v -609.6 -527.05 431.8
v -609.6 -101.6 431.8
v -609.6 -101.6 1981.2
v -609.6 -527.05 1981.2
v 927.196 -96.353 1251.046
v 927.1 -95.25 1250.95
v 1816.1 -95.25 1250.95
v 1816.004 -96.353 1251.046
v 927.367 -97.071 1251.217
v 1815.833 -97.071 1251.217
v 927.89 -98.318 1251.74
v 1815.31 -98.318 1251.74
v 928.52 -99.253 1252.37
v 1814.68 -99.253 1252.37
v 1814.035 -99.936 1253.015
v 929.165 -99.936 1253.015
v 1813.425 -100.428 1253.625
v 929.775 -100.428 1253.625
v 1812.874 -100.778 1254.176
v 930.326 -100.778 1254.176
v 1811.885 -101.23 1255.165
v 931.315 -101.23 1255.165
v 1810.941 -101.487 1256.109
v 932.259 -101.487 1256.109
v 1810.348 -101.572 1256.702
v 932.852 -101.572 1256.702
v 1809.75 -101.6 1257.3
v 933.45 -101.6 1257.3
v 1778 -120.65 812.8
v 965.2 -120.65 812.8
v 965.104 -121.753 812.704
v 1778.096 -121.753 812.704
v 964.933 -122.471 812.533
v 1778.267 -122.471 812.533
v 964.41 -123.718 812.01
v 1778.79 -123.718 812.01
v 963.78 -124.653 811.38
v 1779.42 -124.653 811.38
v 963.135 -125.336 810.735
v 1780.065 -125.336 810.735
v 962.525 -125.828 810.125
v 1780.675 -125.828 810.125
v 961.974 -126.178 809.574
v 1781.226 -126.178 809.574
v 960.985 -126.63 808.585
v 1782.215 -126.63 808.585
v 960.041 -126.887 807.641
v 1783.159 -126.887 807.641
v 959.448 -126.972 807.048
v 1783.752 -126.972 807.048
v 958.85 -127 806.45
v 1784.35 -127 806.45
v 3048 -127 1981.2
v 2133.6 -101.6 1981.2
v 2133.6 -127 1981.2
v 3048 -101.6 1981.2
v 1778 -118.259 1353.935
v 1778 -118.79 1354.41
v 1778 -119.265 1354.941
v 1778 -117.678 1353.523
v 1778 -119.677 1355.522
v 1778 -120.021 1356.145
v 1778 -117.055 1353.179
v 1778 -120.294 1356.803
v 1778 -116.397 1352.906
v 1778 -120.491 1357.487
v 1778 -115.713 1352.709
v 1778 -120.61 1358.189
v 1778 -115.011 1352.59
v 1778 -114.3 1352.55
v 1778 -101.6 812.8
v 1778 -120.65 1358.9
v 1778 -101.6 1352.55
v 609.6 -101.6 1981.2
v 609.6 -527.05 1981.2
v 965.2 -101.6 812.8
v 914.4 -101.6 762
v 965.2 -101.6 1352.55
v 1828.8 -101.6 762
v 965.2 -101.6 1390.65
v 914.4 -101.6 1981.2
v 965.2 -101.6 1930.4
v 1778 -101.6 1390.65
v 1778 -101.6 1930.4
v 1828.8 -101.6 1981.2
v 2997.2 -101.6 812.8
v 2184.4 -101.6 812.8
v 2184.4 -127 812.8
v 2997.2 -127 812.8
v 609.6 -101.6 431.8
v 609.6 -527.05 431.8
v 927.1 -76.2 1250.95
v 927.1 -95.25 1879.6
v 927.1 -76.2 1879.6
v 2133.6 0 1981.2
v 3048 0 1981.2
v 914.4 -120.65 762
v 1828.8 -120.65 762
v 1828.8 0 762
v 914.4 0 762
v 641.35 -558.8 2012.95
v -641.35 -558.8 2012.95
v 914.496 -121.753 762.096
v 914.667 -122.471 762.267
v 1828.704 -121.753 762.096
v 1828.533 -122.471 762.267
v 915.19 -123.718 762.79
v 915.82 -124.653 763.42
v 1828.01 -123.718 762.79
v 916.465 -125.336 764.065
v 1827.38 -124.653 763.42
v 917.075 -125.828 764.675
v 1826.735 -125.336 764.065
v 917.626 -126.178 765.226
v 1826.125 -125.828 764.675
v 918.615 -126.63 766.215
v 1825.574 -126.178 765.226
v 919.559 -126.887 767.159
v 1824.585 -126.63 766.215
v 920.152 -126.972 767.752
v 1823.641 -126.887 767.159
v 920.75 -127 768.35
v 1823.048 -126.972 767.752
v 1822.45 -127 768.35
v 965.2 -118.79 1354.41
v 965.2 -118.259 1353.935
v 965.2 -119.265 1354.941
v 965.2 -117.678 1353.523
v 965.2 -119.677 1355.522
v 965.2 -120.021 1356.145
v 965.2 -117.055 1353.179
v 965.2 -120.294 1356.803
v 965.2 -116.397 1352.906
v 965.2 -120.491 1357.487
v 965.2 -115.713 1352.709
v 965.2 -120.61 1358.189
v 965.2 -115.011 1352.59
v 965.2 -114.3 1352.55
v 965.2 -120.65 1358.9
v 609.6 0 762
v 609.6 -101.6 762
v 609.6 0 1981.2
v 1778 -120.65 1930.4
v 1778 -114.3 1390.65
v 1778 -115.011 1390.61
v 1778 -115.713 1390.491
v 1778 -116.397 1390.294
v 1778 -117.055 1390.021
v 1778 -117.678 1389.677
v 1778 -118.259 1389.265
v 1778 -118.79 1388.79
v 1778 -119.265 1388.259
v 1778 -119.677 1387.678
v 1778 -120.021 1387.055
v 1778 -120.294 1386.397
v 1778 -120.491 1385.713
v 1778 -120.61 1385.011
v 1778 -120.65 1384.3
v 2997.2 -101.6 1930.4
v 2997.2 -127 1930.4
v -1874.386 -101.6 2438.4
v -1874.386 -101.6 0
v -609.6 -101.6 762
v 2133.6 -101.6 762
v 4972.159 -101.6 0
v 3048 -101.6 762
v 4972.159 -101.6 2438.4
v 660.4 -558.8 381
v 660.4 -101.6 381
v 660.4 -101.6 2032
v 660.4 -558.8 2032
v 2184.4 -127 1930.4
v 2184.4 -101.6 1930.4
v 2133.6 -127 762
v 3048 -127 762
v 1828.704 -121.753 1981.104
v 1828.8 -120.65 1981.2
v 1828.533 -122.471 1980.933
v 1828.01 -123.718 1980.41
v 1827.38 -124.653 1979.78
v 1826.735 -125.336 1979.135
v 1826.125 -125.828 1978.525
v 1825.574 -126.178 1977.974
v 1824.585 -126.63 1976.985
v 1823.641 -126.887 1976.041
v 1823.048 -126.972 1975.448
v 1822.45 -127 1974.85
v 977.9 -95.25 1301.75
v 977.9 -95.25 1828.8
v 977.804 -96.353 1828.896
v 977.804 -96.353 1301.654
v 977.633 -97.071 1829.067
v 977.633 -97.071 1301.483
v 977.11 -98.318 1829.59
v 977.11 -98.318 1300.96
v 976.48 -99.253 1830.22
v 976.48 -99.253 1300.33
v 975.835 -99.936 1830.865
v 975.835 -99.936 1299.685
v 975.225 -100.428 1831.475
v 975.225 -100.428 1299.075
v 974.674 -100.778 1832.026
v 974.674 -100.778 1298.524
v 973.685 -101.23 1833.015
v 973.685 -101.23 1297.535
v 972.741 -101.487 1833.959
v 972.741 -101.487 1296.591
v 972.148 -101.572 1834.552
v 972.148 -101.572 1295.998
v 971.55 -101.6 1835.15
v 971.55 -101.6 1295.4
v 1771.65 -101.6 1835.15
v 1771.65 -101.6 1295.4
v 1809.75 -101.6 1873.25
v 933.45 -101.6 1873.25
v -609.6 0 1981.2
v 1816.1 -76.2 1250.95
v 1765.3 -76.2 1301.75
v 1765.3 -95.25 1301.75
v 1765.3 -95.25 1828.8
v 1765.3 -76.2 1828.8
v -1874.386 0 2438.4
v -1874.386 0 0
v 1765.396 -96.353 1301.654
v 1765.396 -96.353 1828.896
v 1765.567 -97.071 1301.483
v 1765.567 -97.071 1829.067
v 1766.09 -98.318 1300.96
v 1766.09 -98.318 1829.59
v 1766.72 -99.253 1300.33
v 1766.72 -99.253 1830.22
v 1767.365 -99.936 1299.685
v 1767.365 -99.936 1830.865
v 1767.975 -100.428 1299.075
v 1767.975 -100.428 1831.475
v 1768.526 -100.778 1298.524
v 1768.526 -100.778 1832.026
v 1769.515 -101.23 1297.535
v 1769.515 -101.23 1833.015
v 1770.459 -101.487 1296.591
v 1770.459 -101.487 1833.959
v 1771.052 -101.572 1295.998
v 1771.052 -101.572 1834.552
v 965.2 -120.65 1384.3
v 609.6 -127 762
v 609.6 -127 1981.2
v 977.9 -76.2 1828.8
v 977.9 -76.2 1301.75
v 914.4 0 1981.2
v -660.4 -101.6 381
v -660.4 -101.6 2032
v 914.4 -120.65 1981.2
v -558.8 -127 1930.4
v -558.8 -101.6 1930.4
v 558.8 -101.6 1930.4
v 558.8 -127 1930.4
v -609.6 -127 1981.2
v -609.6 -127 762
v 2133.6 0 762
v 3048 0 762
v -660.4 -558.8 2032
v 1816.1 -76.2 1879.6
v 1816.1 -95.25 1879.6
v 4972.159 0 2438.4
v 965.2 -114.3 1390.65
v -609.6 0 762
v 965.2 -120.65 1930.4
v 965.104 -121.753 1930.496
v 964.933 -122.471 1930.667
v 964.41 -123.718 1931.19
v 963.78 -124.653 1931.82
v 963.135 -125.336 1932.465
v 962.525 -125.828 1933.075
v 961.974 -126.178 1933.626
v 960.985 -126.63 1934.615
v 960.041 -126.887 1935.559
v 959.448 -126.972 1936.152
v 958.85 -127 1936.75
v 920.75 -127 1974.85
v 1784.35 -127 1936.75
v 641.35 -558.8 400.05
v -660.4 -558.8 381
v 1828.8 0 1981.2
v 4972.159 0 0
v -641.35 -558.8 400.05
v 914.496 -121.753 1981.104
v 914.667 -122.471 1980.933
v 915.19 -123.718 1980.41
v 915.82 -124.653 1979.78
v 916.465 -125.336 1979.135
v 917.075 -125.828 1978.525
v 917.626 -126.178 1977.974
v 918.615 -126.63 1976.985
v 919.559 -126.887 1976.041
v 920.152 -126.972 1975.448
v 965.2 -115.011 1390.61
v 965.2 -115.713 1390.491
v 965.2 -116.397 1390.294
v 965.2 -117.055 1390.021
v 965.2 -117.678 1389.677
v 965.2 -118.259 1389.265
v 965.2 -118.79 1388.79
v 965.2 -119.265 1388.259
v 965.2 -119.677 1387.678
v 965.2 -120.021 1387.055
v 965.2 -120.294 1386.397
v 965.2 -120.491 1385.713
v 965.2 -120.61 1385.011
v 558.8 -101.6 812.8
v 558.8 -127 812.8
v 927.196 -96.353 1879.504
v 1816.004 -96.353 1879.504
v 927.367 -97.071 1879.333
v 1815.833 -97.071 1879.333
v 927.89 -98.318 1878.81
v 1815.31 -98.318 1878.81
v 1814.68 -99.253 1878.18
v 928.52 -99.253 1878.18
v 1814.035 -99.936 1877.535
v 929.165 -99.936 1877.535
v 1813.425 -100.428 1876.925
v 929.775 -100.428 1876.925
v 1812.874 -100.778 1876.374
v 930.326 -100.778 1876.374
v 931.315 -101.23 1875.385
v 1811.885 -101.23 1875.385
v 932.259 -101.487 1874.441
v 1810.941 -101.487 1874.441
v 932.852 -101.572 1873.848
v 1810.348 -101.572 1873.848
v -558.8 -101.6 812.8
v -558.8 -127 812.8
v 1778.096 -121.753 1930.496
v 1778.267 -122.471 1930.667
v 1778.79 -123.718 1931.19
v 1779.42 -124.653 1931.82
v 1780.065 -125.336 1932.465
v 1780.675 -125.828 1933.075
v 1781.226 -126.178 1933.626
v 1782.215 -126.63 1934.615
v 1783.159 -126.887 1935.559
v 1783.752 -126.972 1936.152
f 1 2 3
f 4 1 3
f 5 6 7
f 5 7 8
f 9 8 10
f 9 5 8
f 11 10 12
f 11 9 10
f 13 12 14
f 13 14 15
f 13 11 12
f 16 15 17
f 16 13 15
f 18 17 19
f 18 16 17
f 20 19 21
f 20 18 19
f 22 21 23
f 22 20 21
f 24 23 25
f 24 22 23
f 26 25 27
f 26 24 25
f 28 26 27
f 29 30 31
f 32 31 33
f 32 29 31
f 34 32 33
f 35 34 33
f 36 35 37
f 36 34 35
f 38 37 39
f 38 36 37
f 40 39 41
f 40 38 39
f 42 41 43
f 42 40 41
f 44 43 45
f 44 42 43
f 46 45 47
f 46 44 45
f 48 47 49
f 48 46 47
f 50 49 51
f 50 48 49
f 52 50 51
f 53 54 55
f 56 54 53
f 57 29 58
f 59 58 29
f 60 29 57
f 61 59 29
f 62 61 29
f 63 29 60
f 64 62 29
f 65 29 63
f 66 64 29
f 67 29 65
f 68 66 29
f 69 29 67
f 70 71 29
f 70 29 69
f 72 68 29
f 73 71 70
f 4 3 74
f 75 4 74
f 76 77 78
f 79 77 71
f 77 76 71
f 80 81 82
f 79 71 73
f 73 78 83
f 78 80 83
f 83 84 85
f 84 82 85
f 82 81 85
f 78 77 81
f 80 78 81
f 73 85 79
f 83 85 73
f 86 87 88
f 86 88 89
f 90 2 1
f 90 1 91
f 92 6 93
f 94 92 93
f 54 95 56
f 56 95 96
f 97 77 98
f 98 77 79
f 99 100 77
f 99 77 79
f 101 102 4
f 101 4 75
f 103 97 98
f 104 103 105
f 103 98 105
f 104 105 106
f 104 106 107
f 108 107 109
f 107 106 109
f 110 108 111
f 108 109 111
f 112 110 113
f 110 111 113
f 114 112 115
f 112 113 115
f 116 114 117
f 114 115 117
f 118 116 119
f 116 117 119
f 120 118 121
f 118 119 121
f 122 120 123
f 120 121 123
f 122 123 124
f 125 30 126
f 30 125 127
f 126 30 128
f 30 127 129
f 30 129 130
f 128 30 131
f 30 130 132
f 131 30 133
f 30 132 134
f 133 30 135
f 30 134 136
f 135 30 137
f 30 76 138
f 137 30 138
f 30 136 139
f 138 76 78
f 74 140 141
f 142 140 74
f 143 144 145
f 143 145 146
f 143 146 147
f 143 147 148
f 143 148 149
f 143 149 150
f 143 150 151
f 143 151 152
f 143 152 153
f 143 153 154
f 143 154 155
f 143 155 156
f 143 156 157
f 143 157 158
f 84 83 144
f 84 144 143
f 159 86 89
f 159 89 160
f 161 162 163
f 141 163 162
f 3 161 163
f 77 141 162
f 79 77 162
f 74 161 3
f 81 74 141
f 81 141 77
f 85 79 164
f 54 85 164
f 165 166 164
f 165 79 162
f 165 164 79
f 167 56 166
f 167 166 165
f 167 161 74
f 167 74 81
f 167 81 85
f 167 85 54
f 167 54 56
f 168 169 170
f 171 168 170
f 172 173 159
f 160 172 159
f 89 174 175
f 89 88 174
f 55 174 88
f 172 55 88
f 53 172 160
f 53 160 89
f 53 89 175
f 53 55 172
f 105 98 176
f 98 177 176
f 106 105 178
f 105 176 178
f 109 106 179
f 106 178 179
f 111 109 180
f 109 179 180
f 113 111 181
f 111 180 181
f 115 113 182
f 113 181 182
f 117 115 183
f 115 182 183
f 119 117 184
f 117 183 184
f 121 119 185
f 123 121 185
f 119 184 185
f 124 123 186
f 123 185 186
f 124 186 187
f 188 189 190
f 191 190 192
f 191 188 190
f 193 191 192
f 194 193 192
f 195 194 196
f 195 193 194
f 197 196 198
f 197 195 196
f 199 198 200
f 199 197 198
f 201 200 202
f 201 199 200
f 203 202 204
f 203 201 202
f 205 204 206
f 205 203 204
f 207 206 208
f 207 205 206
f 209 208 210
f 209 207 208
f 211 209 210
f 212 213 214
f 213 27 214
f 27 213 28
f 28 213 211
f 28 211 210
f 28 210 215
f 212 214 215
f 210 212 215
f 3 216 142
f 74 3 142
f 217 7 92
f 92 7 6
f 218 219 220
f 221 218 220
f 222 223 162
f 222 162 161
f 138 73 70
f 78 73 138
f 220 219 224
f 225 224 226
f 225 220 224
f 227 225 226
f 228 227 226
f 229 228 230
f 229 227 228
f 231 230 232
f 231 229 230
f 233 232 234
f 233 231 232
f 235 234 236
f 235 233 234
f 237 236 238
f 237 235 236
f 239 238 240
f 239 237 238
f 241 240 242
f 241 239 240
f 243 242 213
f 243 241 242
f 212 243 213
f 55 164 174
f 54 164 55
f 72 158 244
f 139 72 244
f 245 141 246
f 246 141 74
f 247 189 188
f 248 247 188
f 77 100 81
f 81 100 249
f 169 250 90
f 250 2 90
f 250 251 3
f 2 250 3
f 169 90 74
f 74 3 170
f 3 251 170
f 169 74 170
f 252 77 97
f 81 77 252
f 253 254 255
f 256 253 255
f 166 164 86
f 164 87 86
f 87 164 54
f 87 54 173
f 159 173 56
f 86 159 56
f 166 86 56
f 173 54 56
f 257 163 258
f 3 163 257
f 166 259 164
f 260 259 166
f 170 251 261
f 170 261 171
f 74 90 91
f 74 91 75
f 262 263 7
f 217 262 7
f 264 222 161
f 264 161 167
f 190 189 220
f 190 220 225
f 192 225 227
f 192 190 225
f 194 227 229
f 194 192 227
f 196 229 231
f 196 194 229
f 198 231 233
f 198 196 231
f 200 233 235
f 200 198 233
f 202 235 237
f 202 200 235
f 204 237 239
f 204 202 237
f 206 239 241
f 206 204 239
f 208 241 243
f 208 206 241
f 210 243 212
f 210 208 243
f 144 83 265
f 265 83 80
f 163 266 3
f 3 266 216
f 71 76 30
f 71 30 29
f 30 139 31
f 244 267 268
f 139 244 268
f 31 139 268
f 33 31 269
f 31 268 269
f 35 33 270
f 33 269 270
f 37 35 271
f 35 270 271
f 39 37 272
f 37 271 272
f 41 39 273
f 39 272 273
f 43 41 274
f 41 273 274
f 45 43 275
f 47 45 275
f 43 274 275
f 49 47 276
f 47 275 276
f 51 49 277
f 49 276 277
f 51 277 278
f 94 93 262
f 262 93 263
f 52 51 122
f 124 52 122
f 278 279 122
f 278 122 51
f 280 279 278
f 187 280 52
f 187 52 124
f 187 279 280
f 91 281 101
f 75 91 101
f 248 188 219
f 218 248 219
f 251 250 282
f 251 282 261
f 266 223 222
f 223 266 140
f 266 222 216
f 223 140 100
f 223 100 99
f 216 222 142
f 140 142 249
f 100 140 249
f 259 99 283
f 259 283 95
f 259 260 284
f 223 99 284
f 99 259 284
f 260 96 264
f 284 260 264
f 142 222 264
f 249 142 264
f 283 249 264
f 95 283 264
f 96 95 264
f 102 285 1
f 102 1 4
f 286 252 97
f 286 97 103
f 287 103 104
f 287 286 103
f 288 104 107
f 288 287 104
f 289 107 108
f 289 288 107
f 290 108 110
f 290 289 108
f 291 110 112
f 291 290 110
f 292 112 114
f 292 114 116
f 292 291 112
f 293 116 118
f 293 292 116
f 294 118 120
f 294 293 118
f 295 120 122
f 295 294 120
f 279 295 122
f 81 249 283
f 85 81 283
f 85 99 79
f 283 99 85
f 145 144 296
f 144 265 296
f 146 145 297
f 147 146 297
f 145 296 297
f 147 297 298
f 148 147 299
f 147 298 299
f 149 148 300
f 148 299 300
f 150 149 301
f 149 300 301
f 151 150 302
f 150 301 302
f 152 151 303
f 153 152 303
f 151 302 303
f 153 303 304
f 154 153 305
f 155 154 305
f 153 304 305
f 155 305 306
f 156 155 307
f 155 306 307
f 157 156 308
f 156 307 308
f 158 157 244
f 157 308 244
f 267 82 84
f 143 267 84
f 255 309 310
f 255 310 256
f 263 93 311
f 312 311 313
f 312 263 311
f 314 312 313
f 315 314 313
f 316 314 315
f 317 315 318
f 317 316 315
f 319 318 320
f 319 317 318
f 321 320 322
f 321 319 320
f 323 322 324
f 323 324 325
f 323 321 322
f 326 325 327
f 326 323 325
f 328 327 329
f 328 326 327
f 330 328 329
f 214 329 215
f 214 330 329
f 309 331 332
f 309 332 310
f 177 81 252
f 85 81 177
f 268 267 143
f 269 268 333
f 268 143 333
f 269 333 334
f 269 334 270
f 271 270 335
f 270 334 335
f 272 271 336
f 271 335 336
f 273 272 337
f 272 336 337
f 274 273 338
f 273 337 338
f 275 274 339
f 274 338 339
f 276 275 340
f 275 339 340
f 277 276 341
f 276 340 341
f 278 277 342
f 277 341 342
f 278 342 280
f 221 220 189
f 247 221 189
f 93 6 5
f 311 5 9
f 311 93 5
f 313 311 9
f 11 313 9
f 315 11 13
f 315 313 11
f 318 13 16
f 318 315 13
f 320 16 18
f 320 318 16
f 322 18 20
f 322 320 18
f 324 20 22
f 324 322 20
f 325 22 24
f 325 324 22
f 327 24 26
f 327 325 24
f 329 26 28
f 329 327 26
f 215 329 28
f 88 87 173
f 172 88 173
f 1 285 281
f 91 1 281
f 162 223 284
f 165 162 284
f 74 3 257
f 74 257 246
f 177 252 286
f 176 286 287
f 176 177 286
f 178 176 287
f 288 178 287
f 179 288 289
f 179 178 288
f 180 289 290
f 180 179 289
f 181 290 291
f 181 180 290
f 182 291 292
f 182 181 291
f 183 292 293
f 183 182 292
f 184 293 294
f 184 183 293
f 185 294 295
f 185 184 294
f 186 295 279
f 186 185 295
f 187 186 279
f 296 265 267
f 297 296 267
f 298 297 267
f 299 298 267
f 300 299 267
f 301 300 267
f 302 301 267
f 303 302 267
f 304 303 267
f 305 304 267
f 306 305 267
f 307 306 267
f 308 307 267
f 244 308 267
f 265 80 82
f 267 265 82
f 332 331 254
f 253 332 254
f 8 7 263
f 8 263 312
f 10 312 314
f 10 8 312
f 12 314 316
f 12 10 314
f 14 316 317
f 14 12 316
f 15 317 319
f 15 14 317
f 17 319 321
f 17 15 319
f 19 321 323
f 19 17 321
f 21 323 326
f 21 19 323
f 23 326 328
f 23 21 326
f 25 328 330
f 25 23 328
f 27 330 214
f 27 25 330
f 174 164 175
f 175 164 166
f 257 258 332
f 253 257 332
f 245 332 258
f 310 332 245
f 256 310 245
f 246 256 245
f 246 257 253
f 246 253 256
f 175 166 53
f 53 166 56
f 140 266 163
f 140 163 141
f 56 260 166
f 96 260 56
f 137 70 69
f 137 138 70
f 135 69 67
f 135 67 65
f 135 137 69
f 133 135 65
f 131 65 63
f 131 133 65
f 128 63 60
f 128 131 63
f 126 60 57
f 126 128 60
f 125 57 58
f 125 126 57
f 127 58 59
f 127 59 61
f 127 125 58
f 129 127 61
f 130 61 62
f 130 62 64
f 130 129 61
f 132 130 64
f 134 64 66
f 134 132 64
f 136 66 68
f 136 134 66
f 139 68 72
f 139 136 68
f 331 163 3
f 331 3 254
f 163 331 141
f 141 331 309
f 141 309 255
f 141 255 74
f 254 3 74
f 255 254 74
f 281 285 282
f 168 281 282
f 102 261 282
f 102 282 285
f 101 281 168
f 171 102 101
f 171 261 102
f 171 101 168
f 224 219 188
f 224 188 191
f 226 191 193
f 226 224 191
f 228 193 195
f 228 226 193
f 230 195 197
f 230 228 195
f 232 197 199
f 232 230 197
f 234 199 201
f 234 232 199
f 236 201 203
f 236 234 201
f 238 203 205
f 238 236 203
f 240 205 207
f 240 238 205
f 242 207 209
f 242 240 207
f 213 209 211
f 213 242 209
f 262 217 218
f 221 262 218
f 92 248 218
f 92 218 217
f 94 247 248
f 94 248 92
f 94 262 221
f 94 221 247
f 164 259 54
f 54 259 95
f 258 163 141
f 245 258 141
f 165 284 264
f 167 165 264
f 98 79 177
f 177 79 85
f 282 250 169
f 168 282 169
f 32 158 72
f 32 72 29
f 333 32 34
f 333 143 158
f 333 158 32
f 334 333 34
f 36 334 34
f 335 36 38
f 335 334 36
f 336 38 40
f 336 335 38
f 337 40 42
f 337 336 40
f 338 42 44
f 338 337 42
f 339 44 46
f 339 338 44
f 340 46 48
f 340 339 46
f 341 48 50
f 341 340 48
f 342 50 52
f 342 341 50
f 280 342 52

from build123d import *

# Parameters (mm, degrees)
F0_W      = 6846.545637
F0_H      = 2438.4
F0_W_2    = 1219.2
F0_H_2    = 1219.2
F0_W_3    = 914.4
F1_DEPTH  = 101.6
F2_W      = 1320.8
F2_H      = 1651
F2_W_2    = 1219.2
F2_H_2    = 1549.4
F3_DEPTH  = 457.2
F4_W      = 914.4
F4_H      = 1219.2
F4_W_2    = 812.8
F4_H_2    = 1117.6
F4_W_3    = 1219.2
F4_W_4    = 1117.6
F5_DEPTH  = 25.4
F6_R      = 6.35
F7_W      = 812.8
F7_H      = 38.1
F8_DEPTH  = 19.05
F9_R      = 6.35
F10_SIZE  = 31.75
F12_DEPTH = 25.4
F13_R     = 6.35


with BuildPart() as f1:
    # F0 (on Front) → F1 (new body)
    with BuildSketch(Plane.XZ):
        with Locations((1548.886567, 1219.2)):
            Rectangle(F0_W, F0_H)
        with Locations((0, 1371.6)):
            Rectangle(F0_W_2, F0_H_2, mode=Mode.SUBTRACT)
        with Locations((1371.6, 1371.6)):
            Rectangle(F0_W_3, F0_H_2, mode=Mode.SUBTRACT)
        with Locations((2590.8, 1371.6)):
            Rectangle(F0_W_3, F0_H_2, mode=Mode.SUBTRACT)
    extrude(amount=F1_DEPTH)


with BuildPart() as f3:
    # F2 (on face) → F3 (new body)
    with BuildSketch(Plane.XZ.offset(101.6)):
        with Locations((0, 1206.5)):
            Rectangle(F2_W, F2_H)
        with Locations((0, 1206.5)):
            Rectangle(F2_W_2, F2_H_2, mode=Mode.SUBTRACT)
    extrude(amount=F3_DEPTH)

    # F10
    f10_edges = [f3.edges().sort_by_distance(p)[0] for p in [
        (609.6, -558.8, 1206.5),
        (0, -558.8, 1981.2),
        (0, -558.8, 431.8),
        (-609.6, -558.8, 1206.5),
    ]]
    chamfer(f10_edges, length=F10_SIZE)


with BuildPart() as f5:
    # F4 (on face) → F5 (new body)
    with BuildSketch(Plane.XZ.offset(101.6)):
        with Locations((1371.6, 1371.6)):
            Rectangle(F4_W, F4_H)
        with Locations((1371.6, 1371.6)):
            Rectangle(F4_W_2, F4_H_2, mode=Mode.SUBTRACT)
        with Locations((2590.8, 1371.6)):
            Rectangle(F4_W, F4_H)
        with Locations((2590.8, 1371.6)):
            Rectangle(F4_W_2, F4_H_2, mode=Mode.SUBTRACT)
        with Locations((0, 1371.6)):
            Rectangle(F4_W_3, F4_H)
        with Locations((0, 1371.6)):
            Rectangle(F4_W_4, F4_H_2, mode=Mode.SUBTRACT)
    extrude(amount=F5_DEPTH)

    # F6
    f6_edges = [f5.edges().sort_by_distance(p)[0] for p in [
        (1371.6, -127, 1981.2),
        (914.4, -127, 1371.6),
        (1371.6, -127, 762),
        (1828.8, -127, 1371.6),
        (965.2, -127, 1371.6),
        (1371.6, -127, 1930.4),
        (1778, -127, 1371.6),
        (1371.6, -127, 812.8),
    ]]
    fillet(f6_edges, radius=F6_R)

    # F7 (on face) → F8 (join)
    with BuildSketch(Plane(origin=(0, -101.6, 0), x_dir=(-1, 0, 0), z_dir=(0, 1, 0))):
        with Locations((-1371.6, 1371.6)):
            Rectangle(F7_W, F7_H)
    extrude(amount=-F8_DEPTH)

    # F9
    f9_edges = [f5.edges().sort_by_distance(p)[0] for p in [
        (1371.6, -120.65, 1390.65),
        (1371.6, -120.65, 1352.55),
    ]]
    fillet(f9_edges, radius=F9_R)


with BuildPart() as f12:
    # F11 (on face) → F12 (new body)
    with BuildSketch(Plane(origin=(0, -101.6, 0), x_dir=(-1, 0, 0), z_dir=(0, 1, 0))):
        Polygon((-1778, 1879.6), (-1816.1, 1879.6), (-1816.1, 1250.95), (-1778, 1250.95), (-1778, 1352.55), (-1765.3, 1352.55), (-1765.3, 1390.65), (-1778, 1390.65), align=None)
        Polygon((-927.1, 1879.6), (-965.2, 1879.6), (-965.2, 1390.65), (-977.9, 1390.65), (-977.9, 1352.55), (-965.2, 1352.55), (-965.2, 1250.95), (-927.1, 1250.95), align=None)
        Polygon((-1778, 1352.55), (-1778, 1250.95), (-965.2, 1250.95), (-965.2, 1352.55), (-977.9, 1352.55), (-977.9, 1301.75), (-1765.3, 1301.75), (-1765.3, 1352.55), align=None)
        Polygon((-965.2, 1879.6), (-1778, 1879.6), (-1778, 1390.65), (-1765.3, 1390.65), (-1765.3, 1828.8), (-977.9, 1828.8), (-977.9, 1390.65), (-965.2, 1390.65), align=None)
    extrude(amount=F12_DEPTH)

    # F13
    f13_edges = [f12.edges().sort_by_distance(p)[0] for p in [
        (1816.1, -101.6, 1565.275),
        (1371.6, -101.6, 1250.95),
        (927.1, -101.6, 1565.275),
        (1371.6, -101.6, 1879.6),
        (977.9, -101.6, 1565.275),
        (1371.6, -101.6, 1301.75),
        (1765.3, -101.6, 1565.275),
        (1371.6, -101.6, 1828.8),
    ]]
    fillet(f13_edges, radius=F13_R)


solid = Compound([f1.part, f3.part, f5.part, f12.part])
